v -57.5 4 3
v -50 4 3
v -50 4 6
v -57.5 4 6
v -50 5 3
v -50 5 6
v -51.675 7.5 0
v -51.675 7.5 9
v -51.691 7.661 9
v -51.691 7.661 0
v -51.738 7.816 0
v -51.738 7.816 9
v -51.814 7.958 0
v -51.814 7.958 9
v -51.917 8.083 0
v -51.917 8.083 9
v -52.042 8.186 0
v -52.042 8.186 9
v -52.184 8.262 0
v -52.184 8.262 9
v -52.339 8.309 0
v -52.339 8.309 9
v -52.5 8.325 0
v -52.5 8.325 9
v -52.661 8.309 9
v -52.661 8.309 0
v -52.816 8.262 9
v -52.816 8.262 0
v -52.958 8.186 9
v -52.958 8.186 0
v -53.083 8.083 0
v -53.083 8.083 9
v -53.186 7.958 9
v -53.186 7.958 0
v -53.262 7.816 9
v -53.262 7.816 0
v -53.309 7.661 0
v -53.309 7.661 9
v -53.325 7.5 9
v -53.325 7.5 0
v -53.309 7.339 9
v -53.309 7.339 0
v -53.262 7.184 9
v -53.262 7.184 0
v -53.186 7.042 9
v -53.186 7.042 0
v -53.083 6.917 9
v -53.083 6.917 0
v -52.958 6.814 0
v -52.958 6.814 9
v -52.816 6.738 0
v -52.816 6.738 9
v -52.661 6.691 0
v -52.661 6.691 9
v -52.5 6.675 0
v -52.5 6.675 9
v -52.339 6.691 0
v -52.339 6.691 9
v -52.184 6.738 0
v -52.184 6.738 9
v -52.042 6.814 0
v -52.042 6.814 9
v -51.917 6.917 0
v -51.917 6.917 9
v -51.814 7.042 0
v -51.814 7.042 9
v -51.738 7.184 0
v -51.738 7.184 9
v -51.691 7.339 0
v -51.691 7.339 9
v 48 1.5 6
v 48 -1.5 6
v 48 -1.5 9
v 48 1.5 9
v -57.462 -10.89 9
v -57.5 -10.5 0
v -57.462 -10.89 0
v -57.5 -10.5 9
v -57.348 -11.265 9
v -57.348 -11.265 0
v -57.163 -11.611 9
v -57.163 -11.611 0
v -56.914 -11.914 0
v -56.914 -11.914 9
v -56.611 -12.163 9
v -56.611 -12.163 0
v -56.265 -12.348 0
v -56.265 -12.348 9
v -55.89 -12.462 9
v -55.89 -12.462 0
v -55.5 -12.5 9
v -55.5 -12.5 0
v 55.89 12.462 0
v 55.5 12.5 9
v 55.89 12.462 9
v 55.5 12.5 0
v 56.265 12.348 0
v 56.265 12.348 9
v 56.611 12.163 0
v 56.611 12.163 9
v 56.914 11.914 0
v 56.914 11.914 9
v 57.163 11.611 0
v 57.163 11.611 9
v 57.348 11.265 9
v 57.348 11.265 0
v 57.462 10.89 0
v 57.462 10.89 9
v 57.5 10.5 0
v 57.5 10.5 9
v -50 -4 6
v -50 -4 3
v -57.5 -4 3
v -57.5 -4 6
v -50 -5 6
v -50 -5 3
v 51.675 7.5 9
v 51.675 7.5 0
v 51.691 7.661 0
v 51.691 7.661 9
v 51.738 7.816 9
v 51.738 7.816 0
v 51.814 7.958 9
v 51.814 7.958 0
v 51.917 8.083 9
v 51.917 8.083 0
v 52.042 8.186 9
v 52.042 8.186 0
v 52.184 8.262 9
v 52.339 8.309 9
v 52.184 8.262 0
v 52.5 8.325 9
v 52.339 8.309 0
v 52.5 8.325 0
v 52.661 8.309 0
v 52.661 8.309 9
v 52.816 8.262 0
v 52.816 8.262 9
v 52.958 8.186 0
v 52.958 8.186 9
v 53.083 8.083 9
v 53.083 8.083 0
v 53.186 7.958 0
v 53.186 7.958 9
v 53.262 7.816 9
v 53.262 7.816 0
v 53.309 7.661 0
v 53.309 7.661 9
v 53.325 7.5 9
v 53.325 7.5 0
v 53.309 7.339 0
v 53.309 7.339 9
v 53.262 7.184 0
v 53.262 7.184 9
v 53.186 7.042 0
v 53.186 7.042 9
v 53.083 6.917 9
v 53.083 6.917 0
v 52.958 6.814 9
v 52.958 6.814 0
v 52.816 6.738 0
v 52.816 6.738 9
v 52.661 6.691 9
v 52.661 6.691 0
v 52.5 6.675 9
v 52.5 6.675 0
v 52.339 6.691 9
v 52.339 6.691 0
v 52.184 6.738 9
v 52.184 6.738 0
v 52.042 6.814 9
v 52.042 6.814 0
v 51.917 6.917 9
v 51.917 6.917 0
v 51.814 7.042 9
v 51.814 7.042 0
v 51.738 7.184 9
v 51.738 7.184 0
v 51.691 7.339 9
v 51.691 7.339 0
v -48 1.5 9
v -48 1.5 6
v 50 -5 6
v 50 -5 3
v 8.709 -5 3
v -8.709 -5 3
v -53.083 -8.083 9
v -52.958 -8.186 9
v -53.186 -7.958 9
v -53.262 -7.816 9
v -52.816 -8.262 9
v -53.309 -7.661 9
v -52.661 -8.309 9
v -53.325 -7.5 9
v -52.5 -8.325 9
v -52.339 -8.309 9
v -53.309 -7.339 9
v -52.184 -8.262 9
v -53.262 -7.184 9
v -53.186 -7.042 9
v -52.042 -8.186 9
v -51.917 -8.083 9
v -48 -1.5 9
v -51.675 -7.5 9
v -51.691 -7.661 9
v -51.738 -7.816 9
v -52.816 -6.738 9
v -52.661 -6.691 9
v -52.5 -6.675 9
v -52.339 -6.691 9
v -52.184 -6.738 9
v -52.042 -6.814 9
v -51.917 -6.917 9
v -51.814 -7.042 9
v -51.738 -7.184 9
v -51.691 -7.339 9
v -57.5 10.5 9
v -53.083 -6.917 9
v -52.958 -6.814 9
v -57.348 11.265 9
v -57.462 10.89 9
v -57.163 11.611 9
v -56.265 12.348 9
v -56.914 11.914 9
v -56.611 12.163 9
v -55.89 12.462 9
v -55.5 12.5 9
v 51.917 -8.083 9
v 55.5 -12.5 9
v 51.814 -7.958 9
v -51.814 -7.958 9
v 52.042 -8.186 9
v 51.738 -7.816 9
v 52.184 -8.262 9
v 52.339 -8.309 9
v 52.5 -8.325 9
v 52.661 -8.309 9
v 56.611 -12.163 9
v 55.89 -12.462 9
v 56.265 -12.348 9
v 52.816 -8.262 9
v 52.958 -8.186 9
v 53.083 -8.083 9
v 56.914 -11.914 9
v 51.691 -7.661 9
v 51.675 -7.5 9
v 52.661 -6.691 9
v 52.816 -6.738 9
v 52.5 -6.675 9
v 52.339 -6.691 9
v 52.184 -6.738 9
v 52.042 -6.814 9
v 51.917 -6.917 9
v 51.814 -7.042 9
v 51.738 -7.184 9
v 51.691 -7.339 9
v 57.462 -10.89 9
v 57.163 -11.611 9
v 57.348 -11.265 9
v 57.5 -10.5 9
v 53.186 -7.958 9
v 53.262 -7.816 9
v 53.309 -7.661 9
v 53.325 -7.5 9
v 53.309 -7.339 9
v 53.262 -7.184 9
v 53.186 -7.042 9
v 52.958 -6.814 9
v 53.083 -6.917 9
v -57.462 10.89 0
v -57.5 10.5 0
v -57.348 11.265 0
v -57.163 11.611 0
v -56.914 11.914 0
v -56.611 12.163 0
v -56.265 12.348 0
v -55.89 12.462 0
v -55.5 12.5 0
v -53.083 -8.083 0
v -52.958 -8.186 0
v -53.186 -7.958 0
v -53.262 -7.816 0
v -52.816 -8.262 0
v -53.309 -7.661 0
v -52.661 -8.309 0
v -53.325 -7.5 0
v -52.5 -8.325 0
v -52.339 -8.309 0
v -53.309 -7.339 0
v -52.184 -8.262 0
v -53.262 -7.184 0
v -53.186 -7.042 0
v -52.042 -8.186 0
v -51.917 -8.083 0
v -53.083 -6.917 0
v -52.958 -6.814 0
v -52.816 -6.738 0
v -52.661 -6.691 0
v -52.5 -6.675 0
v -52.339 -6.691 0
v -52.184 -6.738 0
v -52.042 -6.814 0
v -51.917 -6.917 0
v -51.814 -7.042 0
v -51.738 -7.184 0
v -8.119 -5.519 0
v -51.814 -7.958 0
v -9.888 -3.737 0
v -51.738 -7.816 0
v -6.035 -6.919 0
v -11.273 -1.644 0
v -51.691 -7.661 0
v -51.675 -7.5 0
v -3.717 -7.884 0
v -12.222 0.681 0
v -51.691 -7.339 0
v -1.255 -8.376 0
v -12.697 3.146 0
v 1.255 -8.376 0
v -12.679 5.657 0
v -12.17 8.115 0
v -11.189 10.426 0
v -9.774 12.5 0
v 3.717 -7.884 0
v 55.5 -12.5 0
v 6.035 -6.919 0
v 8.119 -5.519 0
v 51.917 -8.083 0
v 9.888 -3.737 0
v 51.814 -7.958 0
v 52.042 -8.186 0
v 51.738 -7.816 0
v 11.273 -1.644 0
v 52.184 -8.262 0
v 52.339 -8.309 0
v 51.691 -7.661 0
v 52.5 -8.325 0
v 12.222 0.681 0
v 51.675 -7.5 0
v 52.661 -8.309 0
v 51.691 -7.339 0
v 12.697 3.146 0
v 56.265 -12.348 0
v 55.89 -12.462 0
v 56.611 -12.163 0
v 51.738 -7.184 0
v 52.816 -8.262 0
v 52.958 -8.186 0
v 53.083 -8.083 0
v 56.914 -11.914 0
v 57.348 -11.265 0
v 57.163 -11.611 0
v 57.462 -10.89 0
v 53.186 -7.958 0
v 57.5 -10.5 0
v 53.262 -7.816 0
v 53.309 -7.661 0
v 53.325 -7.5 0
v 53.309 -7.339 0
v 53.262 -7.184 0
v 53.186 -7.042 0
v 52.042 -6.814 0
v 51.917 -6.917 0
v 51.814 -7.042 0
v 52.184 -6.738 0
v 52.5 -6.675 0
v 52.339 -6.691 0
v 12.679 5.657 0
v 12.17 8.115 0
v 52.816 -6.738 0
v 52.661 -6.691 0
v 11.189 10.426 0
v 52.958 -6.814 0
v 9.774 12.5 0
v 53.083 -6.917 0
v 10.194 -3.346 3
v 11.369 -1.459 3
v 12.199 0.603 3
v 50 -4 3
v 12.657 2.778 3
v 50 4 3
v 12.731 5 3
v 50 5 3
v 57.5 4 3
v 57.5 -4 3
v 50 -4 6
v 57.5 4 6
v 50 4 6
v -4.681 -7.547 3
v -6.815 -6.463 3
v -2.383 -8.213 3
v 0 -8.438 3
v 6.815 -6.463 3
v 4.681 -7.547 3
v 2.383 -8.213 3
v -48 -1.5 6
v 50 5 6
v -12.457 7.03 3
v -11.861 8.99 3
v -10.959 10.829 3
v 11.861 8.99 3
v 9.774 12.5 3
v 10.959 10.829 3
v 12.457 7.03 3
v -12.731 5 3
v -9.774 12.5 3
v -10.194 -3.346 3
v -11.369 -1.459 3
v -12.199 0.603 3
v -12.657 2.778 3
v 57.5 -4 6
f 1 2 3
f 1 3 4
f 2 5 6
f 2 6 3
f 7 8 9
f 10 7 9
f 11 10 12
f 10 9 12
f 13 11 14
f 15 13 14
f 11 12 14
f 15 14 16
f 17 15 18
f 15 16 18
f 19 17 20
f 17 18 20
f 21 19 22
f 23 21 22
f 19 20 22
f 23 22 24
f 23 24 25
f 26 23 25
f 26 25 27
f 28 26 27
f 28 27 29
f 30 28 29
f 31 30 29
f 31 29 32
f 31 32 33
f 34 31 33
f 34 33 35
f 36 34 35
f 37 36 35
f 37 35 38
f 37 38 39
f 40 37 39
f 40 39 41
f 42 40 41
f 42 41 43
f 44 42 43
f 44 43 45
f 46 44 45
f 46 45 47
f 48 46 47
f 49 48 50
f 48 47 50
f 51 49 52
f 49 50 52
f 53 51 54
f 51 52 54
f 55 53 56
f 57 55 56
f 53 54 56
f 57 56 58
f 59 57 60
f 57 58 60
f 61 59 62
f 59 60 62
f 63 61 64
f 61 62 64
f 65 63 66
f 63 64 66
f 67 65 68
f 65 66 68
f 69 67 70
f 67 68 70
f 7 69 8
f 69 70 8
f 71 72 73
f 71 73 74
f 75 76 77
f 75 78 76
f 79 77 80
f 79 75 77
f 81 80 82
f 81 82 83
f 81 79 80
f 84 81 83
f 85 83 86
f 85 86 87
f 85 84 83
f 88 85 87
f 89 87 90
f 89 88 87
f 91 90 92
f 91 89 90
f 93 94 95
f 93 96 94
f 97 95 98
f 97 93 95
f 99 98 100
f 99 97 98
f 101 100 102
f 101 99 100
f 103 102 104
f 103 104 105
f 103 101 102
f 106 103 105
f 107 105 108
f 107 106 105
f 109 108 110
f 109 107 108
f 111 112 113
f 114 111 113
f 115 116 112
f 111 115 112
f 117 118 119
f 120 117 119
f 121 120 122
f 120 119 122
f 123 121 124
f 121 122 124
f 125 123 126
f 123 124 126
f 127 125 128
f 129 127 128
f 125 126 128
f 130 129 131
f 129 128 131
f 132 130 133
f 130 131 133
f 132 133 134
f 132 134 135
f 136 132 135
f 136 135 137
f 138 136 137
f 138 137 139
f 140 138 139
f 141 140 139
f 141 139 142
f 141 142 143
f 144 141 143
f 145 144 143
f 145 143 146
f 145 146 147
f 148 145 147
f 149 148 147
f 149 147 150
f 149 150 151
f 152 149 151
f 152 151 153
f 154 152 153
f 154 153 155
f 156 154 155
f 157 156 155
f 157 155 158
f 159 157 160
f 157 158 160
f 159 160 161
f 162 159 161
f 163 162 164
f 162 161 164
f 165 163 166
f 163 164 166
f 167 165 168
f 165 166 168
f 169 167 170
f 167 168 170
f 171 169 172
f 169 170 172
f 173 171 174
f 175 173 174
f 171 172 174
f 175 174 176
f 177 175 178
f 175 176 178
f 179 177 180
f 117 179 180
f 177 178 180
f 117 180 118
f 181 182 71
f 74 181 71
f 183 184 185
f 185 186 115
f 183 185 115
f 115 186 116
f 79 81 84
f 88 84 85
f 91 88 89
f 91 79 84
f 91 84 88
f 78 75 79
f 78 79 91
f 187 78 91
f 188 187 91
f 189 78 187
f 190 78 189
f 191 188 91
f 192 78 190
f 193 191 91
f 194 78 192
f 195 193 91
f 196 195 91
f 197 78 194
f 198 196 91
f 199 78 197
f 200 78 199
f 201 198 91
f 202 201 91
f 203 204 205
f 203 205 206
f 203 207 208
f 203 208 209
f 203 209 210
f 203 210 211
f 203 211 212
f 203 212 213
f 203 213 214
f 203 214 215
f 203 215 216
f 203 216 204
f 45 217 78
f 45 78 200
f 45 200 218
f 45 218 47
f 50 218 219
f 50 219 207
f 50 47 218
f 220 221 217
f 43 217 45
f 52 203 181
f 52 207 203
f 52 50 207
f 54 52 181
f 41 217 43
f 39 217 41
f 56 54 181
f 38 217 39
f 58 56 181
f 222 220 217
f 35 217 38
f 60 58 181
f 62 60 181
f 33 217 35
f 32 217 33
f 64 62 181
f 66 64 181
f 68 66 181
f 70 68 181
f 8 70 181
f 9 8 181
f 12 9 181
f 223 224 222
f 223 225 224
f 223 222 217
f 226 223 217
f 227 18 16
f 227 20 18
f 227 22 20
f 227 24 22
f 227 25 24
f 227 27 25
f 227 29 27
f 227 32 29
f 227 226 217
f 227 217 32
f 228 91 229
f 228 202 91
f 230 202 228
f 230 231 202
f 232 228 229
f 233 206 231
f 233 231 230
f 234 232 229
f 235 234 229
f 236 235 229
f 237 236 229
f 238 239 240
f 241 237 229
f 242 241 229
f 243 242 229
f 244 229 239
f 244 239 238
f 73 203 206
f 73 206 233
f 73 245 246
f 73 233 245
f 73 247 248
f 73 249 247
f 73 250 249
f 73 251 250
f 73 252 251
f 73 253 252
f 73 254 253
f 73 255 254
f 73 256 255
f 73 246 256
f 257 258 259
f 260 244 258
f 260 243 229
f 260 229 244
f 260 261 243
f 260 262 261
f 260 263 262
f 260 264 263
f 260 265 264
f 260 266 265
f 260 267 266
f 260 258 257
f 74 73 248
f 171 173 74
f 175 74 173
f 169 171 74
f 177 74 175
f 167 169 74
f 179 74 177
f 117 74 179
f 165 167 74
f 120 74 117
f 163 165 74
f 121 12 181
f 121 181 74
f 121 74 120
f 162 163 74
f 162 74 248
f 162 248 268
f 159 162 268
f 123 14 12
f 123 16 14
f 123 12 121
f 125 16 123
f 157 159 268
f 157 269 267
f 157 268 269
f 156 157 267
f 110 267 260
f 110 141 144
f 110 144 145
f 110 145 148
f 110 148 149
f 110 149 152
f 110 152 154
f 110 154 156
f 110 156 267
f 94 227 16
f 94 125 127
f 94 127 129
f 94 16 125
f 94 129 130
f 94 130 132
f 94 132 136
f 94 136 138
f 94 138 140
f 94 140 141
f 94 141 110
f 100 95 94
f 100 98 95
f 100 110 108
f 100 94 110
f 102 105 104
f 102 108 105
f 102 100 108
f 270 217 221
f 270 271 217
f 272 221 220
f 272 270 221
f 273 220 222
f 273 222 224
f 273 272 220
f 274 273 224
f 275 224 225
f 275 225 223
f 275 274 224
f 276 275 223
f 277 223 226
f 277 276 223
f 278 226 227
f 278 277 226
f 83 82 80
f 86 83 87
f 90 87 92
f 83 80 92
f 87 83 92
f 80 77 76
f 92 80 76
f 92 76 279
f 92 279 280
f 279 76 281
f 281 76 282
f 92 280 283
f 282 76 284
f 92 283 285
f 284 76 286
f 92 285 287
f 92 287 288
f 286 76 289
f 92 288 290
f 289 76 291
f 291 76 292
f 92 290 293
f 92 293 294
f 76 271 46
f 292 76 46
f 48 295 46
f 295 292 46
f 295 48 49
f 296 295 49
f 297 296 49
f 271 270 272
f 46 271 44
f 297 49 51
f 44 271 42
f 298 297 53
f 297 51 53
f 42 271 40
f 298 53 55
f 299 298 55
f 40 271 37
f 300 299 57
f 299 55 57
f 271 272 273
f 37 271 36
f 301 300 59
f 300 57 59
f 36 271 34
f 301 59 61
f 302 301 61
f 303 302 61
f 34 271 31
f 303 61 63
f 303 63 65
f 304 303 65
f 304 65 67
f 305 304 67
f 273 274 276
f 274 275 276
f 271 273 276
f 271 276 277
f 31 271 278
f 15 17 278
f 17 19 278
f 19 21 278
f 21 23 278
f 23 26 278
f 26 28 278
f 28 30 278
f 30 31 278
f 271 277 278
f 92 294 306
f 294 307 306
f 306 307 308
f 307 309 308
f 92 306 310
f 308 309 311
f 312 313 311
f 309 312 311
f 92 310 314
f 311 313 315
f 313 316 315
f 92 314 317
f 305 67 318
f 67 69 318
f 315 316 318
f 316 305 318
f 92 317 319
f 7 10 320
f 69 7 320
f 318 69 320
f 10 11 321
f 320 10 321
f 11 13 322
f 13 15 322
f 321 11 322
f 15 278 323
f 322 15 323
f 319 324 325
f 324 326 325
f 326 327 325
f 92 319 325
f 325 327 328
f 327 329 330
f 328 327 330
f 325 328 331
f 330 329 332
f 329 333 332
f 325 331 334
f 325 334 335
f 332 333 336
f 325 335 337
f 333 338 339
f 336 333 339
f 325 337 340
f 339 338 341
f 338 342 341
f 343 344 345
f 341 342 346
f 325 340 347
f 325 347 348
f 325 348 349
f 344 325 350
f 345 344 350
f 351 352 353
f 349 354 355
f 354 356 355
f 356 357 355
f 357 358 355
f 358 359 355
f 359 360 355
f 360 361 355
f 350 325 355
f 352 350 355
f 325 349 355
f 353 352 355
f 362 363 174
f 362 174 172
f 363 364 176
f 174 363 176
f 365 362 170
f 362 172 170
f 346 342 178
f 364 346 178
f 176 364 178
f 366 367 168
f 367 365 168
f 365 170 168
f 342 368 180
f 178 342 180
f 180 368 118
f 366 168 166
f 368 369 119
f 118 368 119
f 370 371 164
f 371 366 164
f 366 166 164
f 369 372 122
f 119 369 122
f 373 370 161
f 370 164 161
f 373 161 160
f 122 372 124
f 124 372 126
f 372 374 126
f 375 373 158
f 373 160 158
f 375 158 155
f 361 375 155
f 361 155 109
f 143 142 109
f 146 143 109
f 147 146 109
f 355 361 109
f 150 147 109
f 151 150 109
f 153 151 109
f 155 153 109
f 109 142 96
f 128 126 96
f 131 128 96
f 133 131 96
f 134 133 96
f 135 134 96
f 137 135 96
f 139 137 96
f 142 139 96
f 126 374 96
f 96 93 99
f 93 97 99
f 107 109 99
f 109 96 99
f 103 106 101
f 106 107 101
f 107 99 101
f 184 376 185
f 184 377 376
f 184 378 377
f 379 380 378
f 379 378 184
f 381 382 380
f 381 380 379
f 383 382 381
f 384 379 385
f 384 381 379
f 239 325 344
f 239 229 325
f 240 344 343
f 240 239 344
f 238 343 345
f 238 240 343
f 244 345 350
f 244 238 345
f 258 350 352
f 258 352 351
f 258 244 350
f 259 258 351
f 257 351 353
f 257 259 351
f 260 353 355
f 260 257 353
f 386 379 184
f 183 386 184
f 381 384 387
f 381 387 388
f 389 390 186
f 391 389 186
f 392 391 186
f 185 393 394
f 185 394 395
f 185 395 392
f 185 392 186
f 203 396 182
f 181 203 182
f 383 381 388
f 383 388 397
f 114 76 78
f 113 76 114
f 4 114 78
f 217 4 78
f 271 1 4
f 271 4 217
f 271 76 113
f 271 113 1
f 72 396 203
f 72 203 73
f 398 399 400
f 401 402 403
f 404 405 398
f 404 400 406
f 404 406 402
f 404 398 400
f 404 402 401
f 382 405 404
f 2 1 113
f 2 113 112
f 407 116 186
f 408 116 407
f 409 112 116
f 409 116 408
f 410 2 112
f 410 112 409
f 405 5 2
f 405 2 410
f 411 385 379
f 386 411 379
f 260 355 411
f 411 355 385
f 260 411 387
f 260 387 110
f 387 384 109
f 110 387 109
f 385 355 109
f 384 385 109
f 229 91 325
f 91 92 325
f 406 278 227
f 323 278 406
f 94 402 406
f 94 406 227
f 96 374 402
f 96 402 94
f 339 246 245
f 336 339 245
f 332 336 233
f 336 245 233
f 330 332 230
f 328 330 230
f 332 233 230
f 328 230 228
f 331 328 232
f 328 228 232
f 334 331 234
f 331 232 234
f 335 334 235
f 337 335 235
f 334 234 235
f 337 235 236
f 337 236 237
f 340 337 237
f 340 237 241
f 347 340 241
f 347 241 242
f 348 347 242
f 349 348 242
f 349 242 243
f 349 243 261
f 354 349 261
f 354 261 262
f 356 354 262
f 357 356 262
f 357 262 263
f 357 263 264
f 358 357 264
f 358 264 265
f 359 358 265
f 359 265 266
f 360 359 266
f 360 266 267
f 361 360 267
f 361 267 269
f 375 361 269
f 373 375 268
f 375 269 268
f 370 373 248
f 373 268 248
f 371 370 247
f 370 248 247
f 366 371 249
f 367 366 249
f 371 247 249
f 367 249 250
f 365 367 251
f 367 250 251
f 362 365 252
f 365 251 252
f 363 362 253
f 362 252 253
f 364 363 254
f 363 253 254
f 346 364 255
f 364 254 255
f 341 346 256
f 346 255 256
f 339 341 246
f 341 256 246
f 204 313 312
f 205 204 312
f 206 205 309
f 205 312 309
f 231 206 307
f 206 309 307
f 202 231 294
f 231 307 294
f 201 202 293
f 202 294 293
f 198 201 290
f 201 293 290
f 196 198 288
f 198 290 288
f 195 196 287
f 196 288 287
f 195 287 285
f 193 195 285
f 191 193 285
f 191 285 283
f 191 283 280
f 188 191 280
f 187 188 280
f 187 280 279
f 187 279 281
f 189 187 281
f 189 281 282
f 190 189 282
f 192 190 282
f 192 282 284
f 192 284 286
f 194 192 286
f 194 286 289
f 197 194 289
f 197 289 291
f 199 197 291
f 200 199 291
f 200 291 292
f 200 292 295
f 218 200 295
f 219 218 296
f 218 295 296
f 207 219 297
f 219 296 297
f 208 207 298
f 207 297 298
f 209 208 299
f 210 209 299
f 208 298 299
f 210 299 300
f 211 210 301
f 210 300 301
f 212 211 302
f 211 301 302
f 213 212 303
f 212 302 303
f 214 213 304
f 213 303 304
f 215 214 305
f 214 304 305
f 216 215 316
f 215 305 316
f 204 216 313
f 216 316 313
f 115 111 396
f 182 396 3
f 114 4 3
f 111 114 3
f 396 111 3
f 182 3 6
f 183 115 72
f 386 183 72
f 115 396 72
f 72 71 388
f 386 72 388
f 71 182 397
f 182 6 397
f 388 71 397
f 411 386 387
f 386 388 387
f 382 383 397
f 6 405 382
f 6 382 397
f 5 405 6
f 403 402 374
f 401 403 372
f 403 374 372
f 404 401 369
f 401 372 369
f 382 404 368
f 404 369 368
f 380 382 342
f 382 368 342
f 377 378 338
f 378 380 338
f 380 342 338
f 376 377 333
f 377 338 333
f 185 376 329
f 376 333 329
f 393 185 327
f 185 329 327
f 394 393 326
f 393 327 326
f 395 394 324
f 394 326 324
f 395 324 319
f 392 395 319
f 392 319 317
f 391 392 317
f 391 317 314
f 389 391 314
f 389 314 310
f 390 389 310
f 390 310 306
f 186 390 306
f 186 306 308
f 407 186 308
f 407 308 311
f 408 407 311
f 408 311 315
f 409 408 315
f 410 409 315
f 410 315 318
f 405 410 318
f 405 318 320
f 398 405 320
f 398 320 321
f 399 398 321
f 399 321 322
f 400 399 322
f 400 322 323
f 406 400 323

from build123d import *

# Parameters (mm, degrees)
SKETCH_W              = 115
SKETCH_H              = 25
PAD_DEPTH             = 3
PAD001_DEPTH          = 3
SKETCH002_W           = 115
SKETCH002_H           = 25
SKETCH002_W_2         = 96
SKETCH002_H_2         = 3
PAD002_DEPTH          = 3
SKETCH003_R           = 0.825
POCKET_DEPTH          = 245.060315
POLARPATTERN_COUNT    = 2
POLARPATTERN001_COUNT = 2
POLARPATTERN002_COUNT = 2
FILLET_R              = 2
SKETCH004_R           = 12.75
POCKET001_DEPTH       = 3


with BuildPart() as part:
    # Sketch → Pad (new body)
    with BuildSketch(Plane.XY):
        Rectangle(SKETCH_W, SKETCH_H)
    extrude(amount=PAD_DEPTH)

    # Sketch001 (on Face6 of Pad) → Pad001 (join)
    with BuildSketch(Plane.XY.offset(3)):
        Polygon((-57.5, 12.5), (57.5, 12.5), (57.5, 4), (50, 4), (50, 5), (-50, 5), (-50, 4), (-57.5, 4), align=None)
        Polygon((-57.5, -12.5), (57.5, -12.5), (57.5, -4), (50, -4), (50, -5), (-50, -5), (-50, -4), (-57.5, -4), align=None)
    extrude(amount=PAD001_DEPTH)

    # Sketch002 (on Face12 of Pad001) → Pad002 (join)
    with BuildSketch(Plane.XY.offset(6)):
        Rectangle(SKETCH002_W, SKETCH002_H)
        Rectangle(SKETCH002_W_2, SKETCH002_H_2, mode=Mode.SUBTRACT)
    extrude(amount=PAD002_DEPTH)

    # Sketch003 (on Face26 of Pad002) → Pocket (cut, through all)
    with BuildSketch(Plane.XY.offset(9)):
        with Locations((-52.5, 7.5)):
            Circle(SKETCH003_R)
    pocket = extrude(amount=-POCKET_DEPTH, mode=Mode.SUBTRACT)

    # PolarPattern: Pocket ×2 about axis
    polarpattern_axis = Axis((0, 0, 0), (0, 1, 0))
    for i in range(1, POLARPATTERN_COUNT):
        add(pocket.rotate(polarpattern_axis, i * 360 / POLARPATTERN_COUNT), mode=Mode.SUBTRACT)

    # PolarPattern001: Pocket ×2 about axis
    polarpattern001_axis = Axis((0, 0, 0), (1, 0, 0))
    for i in range(1, POLARPATTERN001_COUNT):
        add(pocket.rotate(polarpattern001_axis, i * 360 / POLARPATTERN001_COUNT), mode=Mode.SUBTRACT)

    # PolarPattern002: Pocket ×2 about axis
    polarpattern002_axis = Axis((0, 0, 9), (0, 0, 1))
    for i in range(1, POLARPATTERN002_COUNT):
        add(pocket.rotate(polarpattern002_axis, i * 360 / POLARPATTERN002_COUNT), mode=Mode.SUBTRACT)

    # Fillet
    fillet_edges = [part.edges().sort_by_distance(p)[0] for p in [
        (57.5, 12.5, 7.5),
        (57.5, 12.5, 4.5),
        (57.5, 12.5, 1.5),
        (57.5, -12.5, 7.5),
        (-57.5, 12.5, 7.5),
        (-57.5, -12.5, 7.5),
    ]]
    fillet(fillet_edges, radius=FILLET_R)

    # Sketch004 (on Face2 of Fillet) → Pocket001 (cut)
    with BuildSketch(Plane(origin=(0, 0, 0), x_dir=(1, 0, 0), z_dir=(0, 0, -1))):
        with Locations((0, -4.31247)):
            Circle(SKETCH004_R)
    extrude(amount=-POCKET001_DEPTH, mode=Mode.SUBTRACT)


solid = part.part
